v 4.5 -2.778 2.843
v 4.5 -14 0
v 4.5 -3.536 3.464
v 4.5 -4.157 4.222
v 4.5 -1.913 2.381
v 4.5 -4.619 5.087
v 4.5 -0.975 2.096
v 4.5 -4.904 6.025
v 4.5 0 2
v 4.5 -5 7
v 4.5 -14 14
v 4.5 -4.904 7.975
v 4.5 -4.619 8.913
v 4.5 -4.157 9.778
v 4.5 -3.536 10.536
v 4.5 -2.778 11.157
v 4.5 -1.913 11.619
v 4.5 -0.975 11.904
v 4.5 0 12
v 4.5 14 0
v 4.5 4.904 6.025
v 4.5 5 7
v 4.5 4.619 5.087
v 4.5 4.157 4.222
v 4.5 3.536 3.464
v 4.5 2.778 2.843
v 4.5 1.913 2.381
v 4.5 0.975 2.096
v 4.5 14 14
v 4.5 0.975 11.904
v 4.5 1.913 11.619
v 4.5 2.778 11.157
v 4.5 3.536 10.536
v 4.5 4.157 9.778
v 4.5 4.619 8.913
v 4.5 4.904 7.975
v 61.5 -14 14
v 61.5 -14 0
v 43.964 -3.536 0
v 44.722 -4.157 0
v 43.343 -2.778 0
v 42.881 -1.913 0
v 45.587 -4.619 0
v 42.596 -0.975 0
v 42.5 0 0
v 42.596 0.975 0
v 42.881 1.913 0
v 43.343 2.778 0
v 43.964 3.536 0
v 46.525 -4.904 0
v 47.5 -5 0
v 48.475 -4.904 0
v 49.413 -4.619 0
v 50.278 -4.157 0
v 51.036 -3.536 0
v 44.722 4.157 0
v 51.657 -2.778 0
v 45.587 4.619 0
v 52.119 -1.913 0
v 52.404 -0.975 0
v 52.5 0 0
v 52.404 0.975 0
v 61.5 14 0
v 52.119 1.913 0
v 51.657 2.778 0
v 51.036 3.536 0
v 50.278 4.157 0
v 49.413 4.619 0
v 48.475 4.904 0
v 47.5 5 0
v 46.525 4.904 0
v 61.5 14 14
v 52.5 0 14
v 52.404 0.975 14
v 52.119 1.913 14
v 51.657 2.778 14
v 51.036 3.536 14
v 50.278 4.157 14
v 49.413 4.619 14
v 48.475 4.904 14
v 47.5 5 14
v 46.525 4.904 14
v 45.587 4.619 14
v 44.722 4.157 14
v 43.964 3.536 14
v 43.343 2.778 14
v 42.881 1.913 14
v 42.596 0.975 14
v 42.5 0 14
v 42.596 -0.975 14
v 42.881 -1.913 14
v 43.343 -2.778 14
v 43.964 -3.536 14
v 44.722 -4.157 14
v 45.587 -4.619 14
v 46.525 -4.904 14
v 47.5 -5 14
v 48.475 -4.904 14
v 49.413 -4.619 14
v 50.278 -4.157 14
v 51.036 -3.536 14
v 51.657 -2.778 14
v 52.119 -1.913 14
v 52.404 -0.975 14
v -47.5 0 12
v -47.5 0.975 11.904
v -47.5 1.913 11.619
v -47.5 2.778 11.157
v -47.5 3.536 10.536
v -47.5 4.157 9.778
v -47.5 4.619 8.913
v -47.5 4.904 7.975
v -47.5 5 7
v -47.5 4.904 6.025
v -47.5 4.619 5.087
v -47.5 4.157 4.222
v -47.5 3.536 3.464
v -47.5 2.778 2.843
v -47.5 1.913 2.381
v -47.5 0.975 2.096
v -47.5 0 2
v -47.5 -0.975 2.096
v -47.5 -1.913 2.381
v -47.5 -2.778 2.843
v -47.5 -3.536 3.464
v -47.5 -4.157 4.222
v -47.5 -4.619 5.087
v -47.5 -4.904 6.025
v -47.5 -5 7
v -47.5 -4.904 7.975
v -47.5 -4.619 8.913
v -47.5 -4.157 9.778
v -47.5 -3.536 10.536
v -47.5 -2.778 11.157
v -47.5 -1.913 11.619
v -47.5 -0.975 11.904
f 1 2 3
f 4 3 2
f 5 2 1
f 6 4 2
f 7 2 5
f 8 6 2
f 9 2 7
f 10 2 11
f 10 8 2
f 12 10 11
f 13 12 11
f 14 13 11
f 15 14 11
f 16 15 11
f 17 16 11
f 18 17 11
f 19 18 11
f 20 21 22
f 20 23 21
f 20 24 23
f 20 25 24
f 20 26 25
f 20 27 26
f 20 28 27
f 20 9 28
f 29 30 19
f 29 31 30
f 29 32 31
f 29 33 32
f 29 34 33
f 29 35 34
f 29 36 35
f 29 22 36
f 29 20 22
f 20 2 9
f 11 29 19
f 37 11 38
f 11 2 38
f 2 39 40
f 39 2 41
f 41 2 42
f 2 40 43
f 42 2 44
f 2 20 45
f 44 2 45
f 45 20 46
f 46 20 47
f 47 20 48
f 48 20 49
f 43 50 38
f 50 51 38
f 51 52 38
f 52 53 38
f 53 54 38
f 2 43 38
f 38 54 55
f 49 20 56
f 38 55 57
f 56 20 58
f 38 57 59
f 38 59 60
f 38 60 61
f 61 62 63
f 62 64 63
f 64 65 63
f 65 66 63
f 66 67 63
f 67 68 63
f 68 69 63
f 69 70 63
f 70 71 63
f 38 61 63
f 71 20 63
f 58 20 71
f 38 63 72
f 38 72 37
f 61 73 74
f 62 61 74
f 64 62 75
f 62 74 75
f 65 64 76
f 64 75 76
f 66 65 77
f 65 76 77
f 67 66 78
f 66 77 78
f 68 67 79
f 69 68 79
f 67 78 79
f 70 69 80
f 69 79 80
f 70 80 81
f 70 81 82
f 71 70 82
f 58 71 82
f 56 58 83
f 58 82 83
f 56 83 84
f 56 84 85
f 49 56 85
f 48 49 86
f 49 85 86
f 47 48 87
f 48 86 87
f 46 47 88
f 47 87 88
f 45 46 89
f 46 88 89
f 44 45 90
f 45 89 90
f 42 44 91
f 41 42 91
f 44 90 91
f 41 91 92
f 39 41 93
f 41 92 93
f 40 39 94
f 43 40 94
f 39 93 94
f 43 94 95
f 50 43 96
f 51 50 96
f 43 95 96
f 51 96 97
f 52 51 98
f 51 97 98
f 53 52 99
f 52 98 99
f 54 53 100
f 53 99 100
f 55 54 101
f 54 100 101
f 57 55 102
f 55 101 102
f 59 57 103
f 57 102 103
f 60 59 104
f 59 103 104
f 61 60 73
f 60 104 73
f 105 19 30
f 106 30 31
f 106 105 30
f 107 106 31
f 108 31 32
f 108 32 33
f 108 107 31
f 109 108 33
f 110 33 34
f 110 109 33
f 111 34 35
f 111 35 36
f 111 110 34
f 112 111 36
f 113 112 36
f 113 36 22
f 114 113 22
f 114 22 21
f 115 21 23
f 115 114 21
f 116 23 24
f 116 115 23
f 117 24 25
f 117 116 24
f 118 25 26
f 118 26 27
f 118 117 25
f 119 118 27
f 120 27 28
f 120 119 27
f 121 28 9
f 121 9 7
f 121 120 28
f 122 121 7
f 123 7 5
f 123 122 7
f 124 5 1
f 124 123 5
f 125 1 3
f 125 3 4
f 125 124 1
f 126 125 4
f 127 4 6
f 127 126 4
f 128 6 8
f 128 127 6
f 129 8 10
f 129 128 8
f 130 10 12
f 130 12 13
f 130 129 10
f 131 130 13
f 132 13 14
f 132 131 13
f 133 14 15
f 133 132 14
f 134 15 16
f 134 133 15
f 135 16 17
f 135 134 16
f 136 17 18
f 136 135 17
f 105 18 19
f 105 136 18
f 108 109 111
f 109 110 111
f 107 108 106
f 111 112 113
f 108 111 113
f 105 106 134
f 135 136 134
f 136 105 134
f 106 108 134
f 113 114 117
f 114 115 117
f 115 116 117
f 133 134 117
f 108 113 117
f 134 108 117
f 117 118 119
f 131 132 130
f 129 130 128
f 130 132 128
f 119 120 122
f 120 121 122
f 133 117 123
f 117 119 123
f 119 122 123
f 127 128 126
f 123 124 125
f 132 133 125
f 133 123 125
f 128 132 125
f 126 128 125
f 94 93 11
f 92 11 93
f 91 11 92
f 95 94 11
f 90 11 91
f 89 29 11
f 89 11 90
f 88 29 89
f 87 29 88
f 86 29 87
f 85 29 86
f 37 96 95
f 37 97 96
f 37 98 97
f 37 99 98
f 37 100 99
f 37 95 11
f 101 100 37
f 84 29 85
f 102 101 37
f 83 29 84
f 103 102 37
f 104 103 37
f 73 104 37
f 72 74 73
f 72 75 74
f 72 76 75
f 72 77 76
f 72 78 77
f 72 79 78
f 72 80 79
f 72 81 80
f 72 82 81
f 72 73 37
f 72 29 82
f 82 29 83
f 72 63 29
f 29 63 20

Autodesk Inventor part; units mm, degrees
ref_plane "YZ Plane" through (0, 0, 0) normal (1, 0, 0) x (0, 1, 0)
ref_plane "XZ Plane" through (0, 0, 0) normal (0, 1, 0) x (-1, 0, 0)
ref_plane "XY Plane" through (0, 0, 0) normal (0, 0, 1) x (1, 0, 0)
sketch "Sketch1" plane through (0, 0, 0) normal (0, 0, 1) x (1, 0, 0)
  line L0 (-47.5, -14) -> (47.5, -14)
  line L1 (47.5, -14) -> (47.5, 14)
  line L2 (47.5, 14) -> (-47.5, 14)
  line L3 (-47.5, 14) -> (-47.5, -14)
  line L4 (-47.5, -14) -> (47.5, 14) construction
  line L5 (47.5, -14) -> (-47.5, 14) construction
  line L6 (47.5, 14) -> (61.5, 14)
  line L7 (61.5, 14) -> (61.5, -14)
  line L8 (61.5, -14) -> (47.5, -14)
  line L9 (47.5, -14) -> (47.5, 14)
  point P0 (0, 0)
  dimension "d0" = 95
  dimension "d1" = 28
  dimension "d2" = 14
  dimension "d3" = 28
extrude "Extrusion1" add sketch "Sketch1" along normal blind 14
sketch "Sketch2" plane through (0, 0, 14) normal (0, 0, 1) x (1, 0, 0)
  circle A0 centre (47.5, 0) radius 5
  line L0 (61.5, -14) -> (61.5, 14) projected
  line L1 (-47.5, -14) -> (61.5, -14) projected
  point P0 (0, 0)
  dimension "d6" = 10
  dimension "d7" = 14
  dimension "d8" = 14
extrude "Extrusion2" cut sketch "Sketch2" against normal blind 14
sketch "Sketch3" plane through (-47.5, -14, 0) normal (-1, 0, 0) x (0, 0, 1)
  circle A0 centre (7, 14) radius 5
  line L0 (0, 28) -> (14, 28) projected
  line L1 (14, 28) -> (14, 0) projected
  circle A1 centre (7, 14) radius 25
  point P0 (0, 14)
  dimension "d11" = 10
  dimension "d12" = 14
  dimension "d13" = 7
  dimension "d14" = 50
extrude "Extrusion3" cut sketch "Sketch3" against normal blind 52
properties part number "MSAL Pushing Thing"
